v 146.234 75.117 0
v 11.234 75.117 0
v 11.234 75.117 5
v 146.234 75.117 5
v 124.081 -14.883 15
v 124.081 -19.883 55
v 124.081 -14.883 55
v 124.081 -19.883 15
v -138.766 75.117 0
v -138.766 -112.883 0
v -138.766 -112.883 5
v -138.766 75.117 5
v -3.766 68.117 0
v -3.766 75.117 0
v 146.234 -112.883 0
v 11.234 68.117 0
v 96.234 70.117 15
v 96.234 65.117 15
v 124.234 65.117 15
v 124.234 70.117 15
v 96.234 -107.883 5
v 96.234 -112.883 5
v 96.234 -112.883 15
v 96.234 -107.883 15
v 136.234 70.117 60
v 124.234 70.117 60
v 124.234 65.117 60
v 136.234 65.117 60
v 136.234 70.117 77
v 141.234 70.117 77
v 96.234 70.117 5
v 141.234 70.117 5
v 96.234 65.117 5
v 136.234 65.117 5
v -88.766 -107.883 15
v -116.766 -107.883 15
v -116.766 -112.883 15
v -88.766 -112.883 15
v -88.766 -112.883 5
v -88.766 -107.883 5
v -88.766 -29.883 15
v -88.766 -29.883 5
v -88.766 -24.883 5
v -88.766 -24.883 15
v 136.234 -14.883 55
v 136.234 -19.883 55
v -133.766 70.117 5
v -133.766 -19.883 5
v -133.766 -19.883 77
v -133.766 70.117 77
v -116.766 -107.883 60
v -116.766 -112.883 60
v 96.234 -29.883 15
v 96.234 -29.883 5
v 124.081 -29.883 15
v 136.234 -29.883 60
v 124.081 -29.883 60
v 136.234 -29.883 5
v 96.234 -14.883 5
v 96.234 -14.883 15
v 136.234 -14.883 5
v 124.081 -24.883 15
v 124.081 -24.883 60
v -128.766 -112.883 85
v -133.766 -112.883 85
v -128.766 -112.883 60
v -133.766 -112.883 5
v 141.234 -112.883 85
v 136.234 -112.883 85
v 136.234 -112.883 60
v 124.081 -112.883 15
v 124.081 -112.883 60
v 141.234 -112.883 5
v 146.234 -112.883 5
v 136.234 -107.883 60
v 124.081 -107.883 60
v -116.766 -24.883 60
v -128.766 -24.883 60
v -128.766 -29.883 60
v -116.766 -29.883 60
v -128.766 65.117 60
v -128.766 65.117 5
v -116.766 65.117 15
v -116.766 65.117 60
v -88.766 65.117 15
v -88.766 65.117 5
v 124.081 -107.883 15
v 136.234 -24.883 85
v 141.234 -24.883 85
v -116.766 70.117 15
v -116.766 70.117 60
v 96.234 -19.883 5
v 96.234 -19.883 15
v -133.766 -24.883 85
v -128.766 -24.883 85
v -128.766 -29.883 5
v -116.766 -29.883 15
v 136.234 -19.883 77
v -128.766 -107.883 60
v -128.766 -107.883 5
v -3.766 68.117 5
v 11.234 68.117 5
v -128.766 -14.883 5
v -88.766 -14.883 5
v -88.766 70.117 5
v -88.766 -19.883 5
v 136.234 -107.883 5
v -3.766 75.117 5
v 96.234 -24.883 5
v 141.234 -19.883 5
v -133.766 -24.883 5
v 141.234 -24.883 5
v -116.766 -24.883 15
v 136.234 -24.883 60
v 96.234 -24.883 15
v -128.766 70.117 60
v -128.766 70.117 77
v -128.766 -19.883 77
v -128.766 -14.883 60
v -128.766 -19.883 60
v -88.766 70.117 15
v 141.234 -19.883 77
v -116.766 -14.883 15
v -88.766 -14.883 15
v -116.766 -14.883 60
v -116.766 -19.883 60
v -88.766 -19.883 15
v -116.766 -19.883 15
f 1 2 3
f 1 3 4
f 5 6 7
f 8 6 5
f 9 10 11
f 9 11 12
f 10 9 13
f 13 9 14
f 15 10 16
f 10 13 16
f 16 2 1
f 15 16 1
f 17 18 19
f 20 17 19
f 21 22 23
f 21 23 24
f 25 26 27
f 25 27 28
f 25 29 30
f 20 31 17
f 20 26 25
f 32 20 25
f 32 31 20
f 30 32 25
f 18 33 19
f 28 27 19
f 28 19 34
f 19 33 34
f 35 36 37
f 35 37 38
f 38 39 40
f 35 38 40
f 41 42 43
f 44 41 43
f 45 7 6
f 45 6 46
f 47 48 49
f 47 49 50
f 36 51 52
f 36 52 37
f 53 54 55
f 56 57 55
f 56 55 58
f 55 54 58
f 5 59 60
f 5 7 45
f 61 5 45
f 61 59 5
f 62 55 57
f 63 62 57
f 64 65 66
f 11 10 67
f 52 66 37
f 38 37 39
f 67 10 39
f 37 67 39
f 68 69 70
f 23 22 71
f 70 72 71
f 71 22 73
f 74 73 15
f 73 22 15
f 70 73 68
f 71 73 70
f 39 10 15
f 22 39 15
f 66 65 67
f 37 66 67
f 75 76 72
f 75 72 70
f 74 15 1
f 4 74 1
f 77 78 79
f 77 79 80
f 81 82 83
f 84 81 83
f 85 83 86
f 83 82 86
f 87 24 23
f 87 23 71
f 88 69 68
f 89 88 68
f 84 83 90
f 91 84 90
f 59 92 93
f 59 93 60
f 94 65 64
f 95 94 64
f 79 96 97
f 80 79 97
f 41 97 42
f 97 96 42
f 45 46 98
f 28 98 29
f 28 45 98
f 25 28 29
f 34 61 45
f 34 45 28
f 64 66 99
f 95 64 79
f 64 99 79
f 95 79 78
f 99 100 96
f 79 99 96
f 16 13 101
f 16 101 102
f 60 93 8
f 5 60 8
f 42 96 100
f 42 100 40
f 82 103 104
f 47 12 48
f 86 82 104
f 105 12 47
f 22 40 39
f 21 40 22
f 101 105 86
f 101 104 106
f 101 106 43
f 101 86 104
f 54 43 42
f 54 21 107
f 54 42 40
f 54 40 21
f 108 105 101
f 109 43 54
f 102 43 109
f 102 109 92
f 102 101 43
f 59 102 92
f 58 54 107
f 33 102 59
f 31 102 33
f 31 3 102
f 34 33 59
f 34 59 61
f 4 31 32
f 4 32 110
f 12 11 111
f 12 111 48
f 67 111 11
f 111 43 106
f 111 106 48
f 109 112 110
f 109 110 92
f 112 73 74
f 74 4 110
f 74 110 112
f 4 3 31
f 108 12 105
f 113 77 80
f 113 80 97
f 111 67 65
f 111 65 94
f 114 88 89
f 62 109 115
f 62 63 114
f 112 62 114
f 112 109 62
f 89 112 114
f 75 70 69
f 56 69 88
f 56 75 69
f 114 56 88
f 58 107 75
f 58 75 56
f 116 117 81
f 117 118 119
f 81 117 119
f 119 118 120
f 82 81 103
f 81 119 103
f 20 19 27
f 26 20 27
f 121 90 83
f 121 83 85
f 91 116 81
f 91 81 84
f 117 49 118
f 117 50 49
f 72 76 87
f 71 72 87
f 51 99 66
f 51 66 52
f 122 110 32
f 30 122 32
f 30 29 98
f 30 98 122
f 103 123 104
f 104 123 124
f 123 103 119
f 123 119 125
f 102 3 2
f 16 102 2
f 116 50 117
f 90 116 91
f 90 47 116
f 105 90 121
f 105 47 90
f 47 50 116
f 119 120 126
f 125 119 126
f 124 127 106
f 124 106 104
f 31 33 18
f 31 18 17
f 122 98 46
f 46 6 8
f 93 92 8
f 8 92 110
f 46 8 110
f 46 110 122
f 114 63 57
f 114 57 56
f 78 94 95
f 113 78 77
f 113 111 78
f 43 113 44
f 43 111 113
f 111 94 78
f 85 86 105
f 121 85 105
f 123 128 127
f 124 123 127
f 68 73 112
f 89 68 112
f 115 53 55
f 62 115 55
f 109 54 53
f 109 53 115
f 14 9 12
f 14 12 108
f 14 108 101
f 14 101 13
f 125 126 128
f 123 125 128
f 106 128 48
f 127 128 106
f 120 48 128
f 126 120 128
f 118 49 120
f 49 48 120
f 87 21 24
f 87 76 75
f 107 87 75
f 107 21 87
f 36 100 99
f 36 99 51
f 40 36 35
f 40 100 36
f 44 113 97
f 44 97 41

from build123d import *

# Parameters (mm, degrees)
SKETCH1_W                = 285
SKETCH1_H                = 188
BOSS_EXTRUDE1_DEPTH      = 5
SKETCH3_W                = 5
SKETCH3_H                = 90
BOSS_EXTRUDE2_DEPTH      = 72
SKETCH6_W                = 40
SKETCH6_H                = 5
BOSS_EXTRUDE3_DEPTH      = 10
SKETCH7_W                = 12
SKETCH7_H                = 5
BOSS_EXTRUDE4_DEPTH      = 45
SKETCH8_W                = 40
SKETCH8_H                = 5
BOSS_EXTRUDE5_DEPTH      = 72
CUT_EXTRUDE4_DEPTH       = 94
CUT_EXTRUDE4_DEPTH_BACK  = 96
SKETCH13_W               = 5
SKETCH13_H               = 90
BOSS_EXTRUDE6_DEPTH      = 72
SKETCH14_W               = 40
SKETCH14_H               = 5
BOSS_EXTRUDE7_DEPTH      = 55
SKETCH16_W               = 28
SKETCH16_H               = 45
CUT_EXTRUDE5_DEPTH       = 179
CUT_EXTRUDE5_DEPTH_BACK  = 11
SKETCH17_W               = 40
SKETCH17_H               = 5
BOSS_EXTRUDE9_DEPTH      = 55
SKETCH21_W               = 27.761976985
SKETCH21_H               = 40
CUT_EXTRUDE6_DEPTH       = 91
CUT_EXTRUDE6_DEPTH_BACK  = 99
SKETCH22_W               = 5
SKETCH22_H               = 88
BOSS_EXTRUDE10_DEPTH     = 80
SKETCH23_W               = 40
SKETCH23_H               = 5
BOSS_EXTRUDE11_DEPTH     = 55
SKETCH25_W               = 27.891782469
SKETCH25_H               = 44.37316573
CUT_EXTRUDE7_DEPTH       = 184
CUT_EXTRUDE7_DEPTH_BACK  = 6
SKETCH26_W               = 40
SKETCH26_H               = 5
BOSS_EXTRUDE12_DEPTH     = 55
SKETCH27_W               = 28
SKETCH27_H               = 45
CUT_EXTRUDE9_DEPTH       = 101
CUT_EXTRUDE9_DEPTH_BACK  = 89
SKETCH29_W               = 5
SKETCH29_H               = 88
BOSS_EXTRUDE14_DEPTH     = 80
SKETCH30_W               = 40
SKETCH30_H               = 5
BOSS_EXTRUDE15_DEPTH     = 55
SKETCH31_W               = 27.846515173
SKETCH31_H               = 45
CUT_EXTRUDE10_DEPTH      = 184
CUT_EXTRUDE10_DEPTH_BACK = 6
SKETCH32_W               = 40
SKETCH32_H               = 5
BOSS_EXTRUDE16_DEPTH     = 55
SKETCH33_W               = 27.846515173
SKETCH33_H               = 45
CUT_EXTRUDE11_DEPTH      = 84
CUT_EXTRUDE11_DEPTH_BACK = 106
SKETCH36_W               = 15
SKETCH36_H               = 5
CUT_EXTRUDE12_DEPTH      = 1
CUT_EXTRUDE12_DEPTH_BACK = 7


with BuildPart() as part:
    # Sketch1 → Boss-Extrude1 (new body)
    with BuildSketch(Plane.XY):
        with Locations((3.734064661, -18.883040936)):
            Rectangle(SKETCH1_W, SKETCH1_H)
    extrude(amount=BOSS_EXTRUDE1_DEPTH)

    # Sketch3 → Boss-Extrude2 (add)
    with BuildSketch(Plane.XY.offset(5)):
        with Locations((-131.265935339, 25.116959064)):
            Rectangle(SKETCH3_W, SKETCH3_H)
    extrude(amount=BOSS_EXTRUDE2_DEPTH)

    # Sketch6 → Boss-Extrude3 (add)
    with BuildSketch(Plane.XY.offset(5)):
        with Locations((-108.765935339, 67.616959064)):
            Rectangle(SKETCH6_W, SKETCH6_H)
    extrude(amount=BOSS_EXTRUDE3_DEPTH)

    # Sketch7 → Boss-Extrude4 (add)
    with BuildSketch(Plane.XY.offset(15)):
        with Locations((-122.765935339, 67.616959064)):
            Rectangle(SKETCH7_W, SKETCH7_H)
    extrude(amount=BOSS_EXTRUDE4_DEPTH)

    # Sketch8 → Boss-Extrude5 (add)
    with BuildSketch(Plane.XY.offset(77)):
        with Locations((-108.765935339, -17.383040936)):
            Rectangle(SKETCH8_W, SKETCH8_H)
    extrude(amount=-BOSS_EXTRUDE5_DEPTH)

    # Sketch9 → Cut-Extrude4 (cut, two sides)
    with BuildSketch(Plane.XZ.offset(19.883040936)) as cut_extrude4_sk:
        Polygon((-116.765935339, 15), (-88.765935339, 15), (-88.765935339, 77), (-128.765935339, 77), (-128.765935339, 60), (-116.765935339, 60), align=None)
    extrude(amount=CUT_EXTRUDE4_DEPTH, mode=Mode.SUBTRACT)
    extrude(cut_extrude4_sk.sketch, amount=-CUT_EXTRUDE4_DEPTH_BACK, mode=Mode.SUBTRACT)

    # Sketch13 → Boss-Extrude6 (add)
    with BuildSketch(Plane.XY.offset(5)):
        with Locations((138.734064661, 25.116959064)):
            Rectangle(SKETCH13_W, SKETCH13_H)
    extrude(amount=BOSS_EXTRUDE6_DEPTH)

    # Sketch14 → Boss-Extrude7 (add)
    with BuildSketch(Plane.XY.offset(5)):
        with Locations((116.234064661, 67.616959064)):
            Rectangle(SKETCH14_W, SKETCH14_H)
    extrude(amount=BOSS_EXTRUDE7_DEPTH)

    # Sketch16 → Cut-Extrude5 (cut, two sides)
    with BuildSketch(Plane.XZ.offset(-65.116959064)) as cut_extrude5_sk:
        with Locations((110.234064661, 37.5)):
            Rectangle(SKETCH16_W, SKETCH16_H)
    extrude(amount=CUT_EXTRUDE5_DEPTH, mode=Mode.SUBTRACT)
    extrude(cut_extrude5_sk.sketch, amount=-CUT_EXTRUDE5_DEPTH_BACK, mode=Mode.SUBTRACT)

    # Sketch17 → Boss-Extrude9 (add)
    with BuildSketch(Plane.XY):
        with Locations((116.234064661, -17.383040936)):
            Rectangle(SKETCH17_W, SKETCH17_H)
    extrude(amount=BOSS_EXTRUDE9_DEPTH)

    # Sketch21 → Cut-Extrude6 (cut, two sides)
    with BuildSketch(Plane(origin=(0, -14.883040936, 0), x_dir=(1, 0, 0), z_dir=(0, 1, 0))) as cut_extrude6_sk:
        with Locations((110.115053154, -35)):
            Rectangle(SKETCH21_W, SKETCH21_H)
    extrude(amount=CUT_EXTRUDE6_DEPTH, mode=Mode.SUBTRACT)
    extrude(cut_extrude6_sk.sketch, amount=-CUT_EXTRUDE6_DEPTH_BACK, mode=Mode.SUBTRACT)

    # Sketch22 → Boss-Extrude10 (add)
    with BuildSketch(Plane.XY.offset(5)):
        with Locations((-131.265935339, -68.883040936)):
            Rectangle(SKETCH22_W, SKETCH22_H)
    extrude(amount=BOSS_EXTRUDE10_DEPTH)

    # Sketch23 → Boss-Extrude11 (add)
    with BuildSketch(Plane.XY.offset(5)):
        with Locations((-108.765935339, -110.383040936)):
            Rectangle(SKETCH23_W, SKETCH23_H)
    extrude(amount=BOSS_EXTRUDE11_DEPTH)

    # Sketch25 → Cut-Extrude7 (cut, two sides)
    with BuildSketch(Plane(origin=(0, -107.883040936, 0), x_dir=(1, 0, 0), z_dir=(0, 1, 0))) as cut_extrude7_sk:
        with Locations((-102.711826574, -37.813417135)):
            Rectangle(SKETCH25_W, SKETCH25_H)
    extrude(amount=CUT_EXTRUDE7_DEPTH, mode=Mode.SUBTRACT)
    extrude(cut_extrude7_sk.sketch, amount=-CUT_EXTRUDE7_DEPTH_BACK, mode=Mode.SUBTRACT)

    # Sketch26 → Boss-Extrude12 (add)
    with BuildSketch(Plane.XY.offset(5)):
        with Locations((-108.765935339, -27.383040936)):
            Rectangle(SKETCH26_W, SKETCH26_H)
    extrude(amount=BOSS_EXTRUDE12_DEPTH)

    # Sketch27 → Cut-Extrude9 (cut, two sides)
    with BuildSketch(Plane(origin=(0, -24.883040936, 0), x_dir=(1, 0, 0), z_dir=(0, 1, 0))) as cut_extrude9_sk:
        with Locations((-102.765935339, -37.5)):
            Rectangle(SKETCH27_W, SKETCH27_H)
    extrude(amount=CUT_EXTRUDE9_DEPTH, mode=Mode.SUBTRACT)
    extrude(cut_extrude9_sk.sketch, amount=-CUT_EXTRUDE9_DEPTH_BACK, mode=Mode.SUBTRACT)

    # Sketch29 → Boss-Extrude14 (add)
    with BuildSketch(Plane.XY.offset(5)):
        with Locations((138.734064661, -68.883040936)):
            Rectangle(SKETCH29_W, SKETCH29_H)
    extrude(amount=BOSS_EXTRUDE14_DEPTH)

    # Sketch30 → Boss-Extrude15 (add)
    with BuildSketch(Plane.XY.offset(5)):
        with Locations((116.234064661, -110.383040936)):
            Rectangle(SKETCH30_W, SKETCH30_H)
    extrude(amount=BOSS_EXTRUDE15_DEPTH)

    # Sketch31 → Cut-Extrude10 (cut, two sides)
    with BuildSketch(Plane(origin=(0, -107.883040936, 0), x_dir=(1, 0, 0), z_dir=(0, 1, 0))) as cut_extrude10_sk:
        with Locations((110.157322248, -37.5)):
            Rectangle(SKETCH31_W, SKETCH31_H)
    extrude(amount=CUT_EXTRUDE10_DEPTH, mode=Mode.SUBTRACT)
    extrude(cut_extrude10_sk.sketch, amount=-CUT_EXTRUDE10_DEPTH_BACK, mode=Mode.SUBTRACT)

    # Sketch32 → Boss-Extrude16 (add)
    with BuildSketch(Plane.XY.offset(5)):
        with Locations((116.234064661, -27.383040936)):
            Rectangle(SKETCH32_W, SKETCH32_H)
    extrude(amount=BOSS_EXTRUDE16_DEPTH)

    # Sketch33 → Cut-Extrude11 (cut, two sides)
    with BuildSketch(Plane.XZ.offset(29.883040936)) as cut_extrude11_sk:
        with Locations((110.157322248, 37.5)):
            Rectangle(SKETCH33_W, SKETCH33_H)
    extrude(amount=CUT_EXTRUDE11_DEPTH, mode=Mode.SUBTRACT)
    extrude(cut_extrude11_sk.sketch, amount=-CUT_EXTRUDE11_DEPTH_BACK, mode=Mode.SUBTRACT)

    # Sketch36 → Cut-Extrude12 (cut, two sides)
    with BuildSketch(Plane(origin=(0, 75.116959064, 0), x_dir=(1, 0, 0), z_dir=(0, 1, 0))) as cut_extrude12_sk:
        with Locations((3.734064661, -2.5)):
            Rectangle(SKETCH36_W, SKETCH36_H)
    extrude(amount=CUT_EXTRUDE12_DEPTH, mode=Mode.SUBTRACT)
    extrude(cut_extrude12_sk.sketch, amount=-CUT_EXTRUDE12_DEPTH_BACK, mode=Mode.SUBTRACT)


solid = part.part
